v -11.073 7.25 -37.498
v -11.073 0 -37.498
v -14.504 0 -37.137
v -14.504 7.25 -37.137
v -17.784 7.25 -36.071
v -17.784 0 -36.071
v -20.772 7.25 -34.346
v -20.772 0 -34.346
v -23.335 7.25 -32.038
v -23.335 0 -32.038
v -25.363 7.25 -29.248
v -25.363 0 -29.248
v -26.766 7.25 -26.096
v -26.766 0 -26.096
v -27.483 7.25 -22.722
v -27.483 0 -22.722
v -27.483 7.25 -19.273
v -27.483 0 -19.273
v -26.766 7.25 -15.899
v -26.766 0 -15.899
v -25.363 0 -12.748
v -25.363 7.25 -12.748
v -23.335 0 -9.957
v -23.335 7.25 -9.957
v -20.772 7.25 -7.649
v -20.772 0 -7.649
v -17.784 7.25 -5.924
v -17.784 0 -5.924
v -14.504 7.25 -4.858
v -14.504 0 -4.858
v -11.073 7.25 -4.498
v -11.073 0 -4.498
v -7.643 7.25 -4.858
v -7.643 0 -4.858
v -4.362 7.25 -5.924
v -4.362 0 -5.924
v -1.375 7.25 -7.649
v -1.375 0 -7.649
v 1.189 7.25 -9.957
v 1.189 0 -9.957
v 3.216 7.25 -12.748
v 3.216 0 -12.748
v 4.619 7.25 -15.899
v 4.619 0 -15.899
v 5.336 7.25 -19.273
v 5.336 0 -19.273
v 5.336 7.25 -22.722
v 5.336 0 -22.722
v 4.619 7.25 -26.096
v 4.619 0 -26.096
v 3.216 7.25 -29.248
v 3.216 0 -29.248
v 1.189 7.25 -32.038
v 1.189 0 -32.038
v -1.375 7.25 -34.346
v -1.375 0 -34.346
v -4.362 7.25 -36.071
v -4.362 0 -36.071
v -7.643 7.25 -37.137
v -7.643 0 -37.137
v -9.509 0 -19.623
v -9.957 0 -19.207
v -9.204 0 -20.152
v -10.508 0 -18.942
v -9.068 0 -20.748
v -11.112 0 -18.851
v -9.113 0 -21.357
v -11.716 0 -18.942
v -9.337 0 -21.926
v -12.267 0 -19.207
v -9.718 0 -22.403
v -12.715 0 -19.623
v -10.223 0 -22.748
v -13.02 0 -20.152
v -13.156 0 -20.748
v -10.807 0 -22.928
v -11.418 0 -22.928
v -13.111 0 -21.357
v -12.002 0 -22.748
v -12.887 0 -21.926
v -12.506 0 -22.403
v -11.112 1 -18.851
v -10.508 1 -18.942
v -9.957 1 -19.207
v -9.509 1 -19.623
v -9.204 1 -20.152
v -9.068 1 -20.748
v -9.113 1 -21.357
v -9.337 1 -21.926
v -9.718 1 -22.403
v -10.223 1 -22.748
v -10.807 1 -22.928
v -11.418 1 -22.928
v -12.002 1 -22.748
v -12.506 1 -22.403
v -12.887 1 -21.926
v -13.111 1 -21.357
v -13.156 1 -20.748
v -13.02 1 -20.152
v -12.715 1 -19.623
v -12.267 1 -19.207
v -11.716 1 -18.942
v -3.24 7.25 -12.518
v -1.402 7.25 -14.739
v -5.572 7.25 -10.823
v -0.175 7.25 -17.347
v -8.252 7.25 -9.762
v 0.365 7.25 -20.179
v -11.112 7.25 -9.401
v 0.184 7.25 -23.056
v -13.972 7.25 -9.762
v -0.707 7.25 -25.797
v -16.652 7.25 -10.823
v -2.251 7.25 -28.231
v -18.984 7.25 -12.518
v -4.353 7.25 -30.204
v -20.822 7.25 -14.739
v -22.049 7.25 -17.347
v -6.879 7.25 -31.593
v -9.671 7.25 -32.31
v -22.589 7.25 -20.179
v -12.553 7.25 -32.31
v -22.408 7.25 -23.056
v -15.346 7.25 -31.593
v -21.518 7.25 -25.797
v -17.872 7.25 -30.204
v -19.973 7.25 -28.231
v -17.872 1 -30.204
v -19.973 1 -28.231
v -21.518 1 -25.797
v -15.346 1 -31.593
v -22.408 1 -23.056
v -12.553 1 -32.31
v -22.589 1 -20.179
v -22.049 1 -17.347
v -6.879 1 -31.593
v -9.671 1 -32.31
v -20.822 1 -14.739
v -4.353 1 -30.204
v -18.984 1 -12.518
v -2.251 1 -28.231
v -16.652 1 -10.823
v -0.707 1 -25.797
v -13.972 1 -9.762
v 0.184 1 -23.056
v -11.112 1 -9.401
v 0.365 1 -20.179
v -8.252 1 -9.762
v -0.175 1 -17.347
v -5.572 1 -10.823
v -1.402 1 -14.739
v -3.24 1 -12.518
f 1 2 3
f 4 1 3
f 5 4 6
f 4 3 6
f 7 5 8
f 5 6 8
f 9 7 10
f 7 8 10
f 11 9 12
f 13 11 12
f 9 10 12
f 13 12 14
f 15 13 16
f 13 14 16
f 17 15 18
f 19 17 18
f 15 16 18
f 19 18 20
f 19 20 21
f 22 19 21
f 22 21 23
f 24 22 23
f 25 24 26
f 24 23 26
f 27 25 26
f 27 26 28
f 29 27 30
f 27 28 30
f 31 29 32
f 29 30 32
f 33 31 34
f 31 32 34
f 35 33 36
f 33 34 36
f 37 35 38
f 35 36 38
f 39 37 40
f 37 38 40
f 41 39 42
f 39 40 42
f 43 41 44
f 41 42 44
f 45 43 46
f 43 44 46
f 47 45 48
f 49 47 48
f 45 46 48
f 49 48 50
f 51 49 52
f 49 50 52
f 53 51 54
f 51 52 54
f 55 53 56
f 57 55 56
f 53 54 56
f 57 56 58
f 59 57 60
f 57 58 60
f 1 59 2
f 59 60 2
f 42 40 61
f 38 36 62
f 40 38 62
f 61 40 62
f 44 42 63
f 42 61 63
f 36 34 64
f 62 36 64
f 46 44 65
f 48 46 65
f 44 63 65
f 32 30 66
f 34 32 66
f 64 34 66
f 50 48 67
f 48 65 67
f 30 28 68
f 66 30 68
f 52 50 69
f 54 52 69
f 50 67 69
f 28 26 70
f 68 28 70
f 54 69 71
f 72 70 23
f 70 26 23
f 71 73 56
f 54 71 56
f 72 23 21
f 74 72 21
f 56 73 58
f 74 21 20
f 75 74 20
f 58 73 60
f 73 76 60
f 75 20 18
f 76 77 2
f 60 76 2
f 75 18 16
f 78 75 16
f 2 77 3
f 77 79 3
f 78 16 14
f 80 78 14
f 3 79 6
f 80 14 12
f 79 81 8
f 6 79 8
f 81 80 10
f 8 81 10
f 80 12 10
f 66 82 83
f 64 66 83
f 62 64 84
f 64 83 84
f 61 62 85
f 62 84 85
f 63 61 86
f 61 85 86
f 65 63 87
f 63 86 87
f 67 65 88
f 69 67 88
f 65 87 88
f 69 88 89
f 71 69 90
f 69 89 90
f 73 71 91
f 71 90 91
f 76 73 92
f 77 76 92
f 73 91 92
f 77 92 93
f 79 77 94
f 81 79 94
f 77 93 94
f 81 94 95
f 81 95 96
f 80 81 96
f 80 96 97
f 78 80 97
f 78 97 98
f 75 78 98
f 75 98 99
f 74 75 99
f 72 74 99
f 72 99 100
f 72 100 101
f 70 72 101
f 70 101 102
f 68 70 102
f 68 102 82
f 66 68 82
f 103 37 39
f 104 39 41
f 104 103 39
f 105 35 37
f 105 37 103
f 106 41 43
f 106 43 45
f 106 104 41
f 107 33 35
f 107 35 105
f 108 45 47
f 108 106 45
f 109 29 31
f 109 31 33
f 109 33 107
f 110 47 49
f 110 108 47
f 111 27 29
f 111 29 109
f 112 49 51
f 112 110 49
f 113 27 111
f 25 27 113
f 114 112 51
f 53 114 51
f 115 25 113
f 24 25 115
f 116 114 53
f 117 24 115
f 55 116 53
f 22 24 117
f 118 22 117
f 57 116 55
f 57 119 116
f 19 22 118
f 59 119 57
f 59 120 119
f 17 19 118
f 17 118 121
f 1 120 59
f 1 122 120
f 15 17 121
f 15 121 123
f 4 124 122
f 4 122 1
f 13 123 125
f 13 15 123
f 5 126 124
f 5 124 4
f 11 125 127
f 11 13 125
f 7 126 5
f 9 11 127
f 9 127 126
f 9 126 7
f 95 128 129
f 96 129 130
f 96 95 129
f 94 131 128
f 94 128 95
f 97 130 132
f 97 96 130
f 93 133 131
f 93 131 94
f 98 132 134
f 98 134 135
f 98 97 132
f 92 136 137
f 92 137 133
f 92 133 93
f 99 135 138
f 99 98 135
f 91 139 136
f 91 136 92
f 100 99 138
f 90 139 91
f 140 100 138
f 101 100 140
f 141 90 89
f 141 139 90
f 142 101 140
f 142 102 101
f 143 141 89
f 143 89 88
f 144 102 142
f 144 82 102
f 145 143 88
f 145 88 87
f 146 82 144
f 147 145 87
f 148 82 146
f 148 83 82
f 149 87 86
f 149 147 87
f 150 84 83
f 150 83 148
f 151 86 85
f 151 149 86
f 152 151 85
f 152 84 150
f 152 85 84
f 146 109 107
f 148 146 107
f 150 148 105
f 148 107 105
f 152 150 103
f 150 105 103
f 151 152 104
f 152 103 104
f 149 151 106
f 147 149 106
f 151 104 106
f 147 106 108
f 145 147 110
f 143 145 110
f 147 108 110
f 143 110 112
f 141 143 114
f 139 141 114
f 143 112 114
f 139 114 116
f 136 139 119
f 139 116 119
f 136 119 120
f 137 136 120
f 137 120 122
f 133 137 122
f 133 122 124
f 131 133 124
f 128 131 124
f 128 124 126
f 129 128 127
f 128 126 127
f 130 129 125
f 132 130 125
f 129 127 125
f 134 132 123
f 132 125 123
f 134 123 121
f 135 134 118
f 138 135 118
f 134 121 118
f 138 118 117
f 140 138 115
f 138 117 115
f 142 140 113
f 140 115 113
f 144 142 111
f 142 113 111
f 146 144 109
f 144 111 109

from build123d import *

# Parameters (mm, degrees)
SKETCH1_R           = 16.5
BOSS_EXTRUDE1_DEPTH = 7.25
SKETCH2_R           = 2.05
CUT_EXTRUDE1_DEPTH  = 48.105394919
SKETCH9_R           = 11.5
CUT_EXTRUDE2_DEPTH  = 6.25


with BuildPart() as part:
    # Sketch1 → Boss-Extrude1 (new body)
    with BuildSketch(Plane(origin=(0, 0, 0), x_dir=(1, 0, 0), z_dir=(0, 1, 0))):
        with Locations(Location((-11.073338277, 20.997556543, 0), (0, 0, 90))):
            Circle(SKETCH1_R)
    extrude(amount=BOSS_EXTRUDE1_DEPTH)

    # Sketch2 → Cut-Extrude1 (cut, through all)
    with BuildSketch(Plane(origin=(0, 7.25, 0), x_dir=(1, 0, 0), z_dir=(0, 1, 0))):
        with Locations(Location((-11.112077012, 20.900709706, 0), (0, 0, 270))):
            Circle(SKETCH2_R)
    extrude(amount=-CUT_EXTRUDE1_DEPTH, mode=Mode.SUBTRACT)

    # Sketch9 → Cut-Extrude2 (cut)
    with BuildSketch(Plane(origin=(0, 7.25, 0), x_dir=(1, 0, 0), z_dir=(0, 1, 0))):
        with Locations(Location((-11.112077012, 20.900709706, 0), (0, 0, 270))):
            Circle(SKETCH9_R)
    extrude(amount=-CUT_EXTRUDE2_DEPTH, mode=Mode.SUBTRACT)


solid = part.part
